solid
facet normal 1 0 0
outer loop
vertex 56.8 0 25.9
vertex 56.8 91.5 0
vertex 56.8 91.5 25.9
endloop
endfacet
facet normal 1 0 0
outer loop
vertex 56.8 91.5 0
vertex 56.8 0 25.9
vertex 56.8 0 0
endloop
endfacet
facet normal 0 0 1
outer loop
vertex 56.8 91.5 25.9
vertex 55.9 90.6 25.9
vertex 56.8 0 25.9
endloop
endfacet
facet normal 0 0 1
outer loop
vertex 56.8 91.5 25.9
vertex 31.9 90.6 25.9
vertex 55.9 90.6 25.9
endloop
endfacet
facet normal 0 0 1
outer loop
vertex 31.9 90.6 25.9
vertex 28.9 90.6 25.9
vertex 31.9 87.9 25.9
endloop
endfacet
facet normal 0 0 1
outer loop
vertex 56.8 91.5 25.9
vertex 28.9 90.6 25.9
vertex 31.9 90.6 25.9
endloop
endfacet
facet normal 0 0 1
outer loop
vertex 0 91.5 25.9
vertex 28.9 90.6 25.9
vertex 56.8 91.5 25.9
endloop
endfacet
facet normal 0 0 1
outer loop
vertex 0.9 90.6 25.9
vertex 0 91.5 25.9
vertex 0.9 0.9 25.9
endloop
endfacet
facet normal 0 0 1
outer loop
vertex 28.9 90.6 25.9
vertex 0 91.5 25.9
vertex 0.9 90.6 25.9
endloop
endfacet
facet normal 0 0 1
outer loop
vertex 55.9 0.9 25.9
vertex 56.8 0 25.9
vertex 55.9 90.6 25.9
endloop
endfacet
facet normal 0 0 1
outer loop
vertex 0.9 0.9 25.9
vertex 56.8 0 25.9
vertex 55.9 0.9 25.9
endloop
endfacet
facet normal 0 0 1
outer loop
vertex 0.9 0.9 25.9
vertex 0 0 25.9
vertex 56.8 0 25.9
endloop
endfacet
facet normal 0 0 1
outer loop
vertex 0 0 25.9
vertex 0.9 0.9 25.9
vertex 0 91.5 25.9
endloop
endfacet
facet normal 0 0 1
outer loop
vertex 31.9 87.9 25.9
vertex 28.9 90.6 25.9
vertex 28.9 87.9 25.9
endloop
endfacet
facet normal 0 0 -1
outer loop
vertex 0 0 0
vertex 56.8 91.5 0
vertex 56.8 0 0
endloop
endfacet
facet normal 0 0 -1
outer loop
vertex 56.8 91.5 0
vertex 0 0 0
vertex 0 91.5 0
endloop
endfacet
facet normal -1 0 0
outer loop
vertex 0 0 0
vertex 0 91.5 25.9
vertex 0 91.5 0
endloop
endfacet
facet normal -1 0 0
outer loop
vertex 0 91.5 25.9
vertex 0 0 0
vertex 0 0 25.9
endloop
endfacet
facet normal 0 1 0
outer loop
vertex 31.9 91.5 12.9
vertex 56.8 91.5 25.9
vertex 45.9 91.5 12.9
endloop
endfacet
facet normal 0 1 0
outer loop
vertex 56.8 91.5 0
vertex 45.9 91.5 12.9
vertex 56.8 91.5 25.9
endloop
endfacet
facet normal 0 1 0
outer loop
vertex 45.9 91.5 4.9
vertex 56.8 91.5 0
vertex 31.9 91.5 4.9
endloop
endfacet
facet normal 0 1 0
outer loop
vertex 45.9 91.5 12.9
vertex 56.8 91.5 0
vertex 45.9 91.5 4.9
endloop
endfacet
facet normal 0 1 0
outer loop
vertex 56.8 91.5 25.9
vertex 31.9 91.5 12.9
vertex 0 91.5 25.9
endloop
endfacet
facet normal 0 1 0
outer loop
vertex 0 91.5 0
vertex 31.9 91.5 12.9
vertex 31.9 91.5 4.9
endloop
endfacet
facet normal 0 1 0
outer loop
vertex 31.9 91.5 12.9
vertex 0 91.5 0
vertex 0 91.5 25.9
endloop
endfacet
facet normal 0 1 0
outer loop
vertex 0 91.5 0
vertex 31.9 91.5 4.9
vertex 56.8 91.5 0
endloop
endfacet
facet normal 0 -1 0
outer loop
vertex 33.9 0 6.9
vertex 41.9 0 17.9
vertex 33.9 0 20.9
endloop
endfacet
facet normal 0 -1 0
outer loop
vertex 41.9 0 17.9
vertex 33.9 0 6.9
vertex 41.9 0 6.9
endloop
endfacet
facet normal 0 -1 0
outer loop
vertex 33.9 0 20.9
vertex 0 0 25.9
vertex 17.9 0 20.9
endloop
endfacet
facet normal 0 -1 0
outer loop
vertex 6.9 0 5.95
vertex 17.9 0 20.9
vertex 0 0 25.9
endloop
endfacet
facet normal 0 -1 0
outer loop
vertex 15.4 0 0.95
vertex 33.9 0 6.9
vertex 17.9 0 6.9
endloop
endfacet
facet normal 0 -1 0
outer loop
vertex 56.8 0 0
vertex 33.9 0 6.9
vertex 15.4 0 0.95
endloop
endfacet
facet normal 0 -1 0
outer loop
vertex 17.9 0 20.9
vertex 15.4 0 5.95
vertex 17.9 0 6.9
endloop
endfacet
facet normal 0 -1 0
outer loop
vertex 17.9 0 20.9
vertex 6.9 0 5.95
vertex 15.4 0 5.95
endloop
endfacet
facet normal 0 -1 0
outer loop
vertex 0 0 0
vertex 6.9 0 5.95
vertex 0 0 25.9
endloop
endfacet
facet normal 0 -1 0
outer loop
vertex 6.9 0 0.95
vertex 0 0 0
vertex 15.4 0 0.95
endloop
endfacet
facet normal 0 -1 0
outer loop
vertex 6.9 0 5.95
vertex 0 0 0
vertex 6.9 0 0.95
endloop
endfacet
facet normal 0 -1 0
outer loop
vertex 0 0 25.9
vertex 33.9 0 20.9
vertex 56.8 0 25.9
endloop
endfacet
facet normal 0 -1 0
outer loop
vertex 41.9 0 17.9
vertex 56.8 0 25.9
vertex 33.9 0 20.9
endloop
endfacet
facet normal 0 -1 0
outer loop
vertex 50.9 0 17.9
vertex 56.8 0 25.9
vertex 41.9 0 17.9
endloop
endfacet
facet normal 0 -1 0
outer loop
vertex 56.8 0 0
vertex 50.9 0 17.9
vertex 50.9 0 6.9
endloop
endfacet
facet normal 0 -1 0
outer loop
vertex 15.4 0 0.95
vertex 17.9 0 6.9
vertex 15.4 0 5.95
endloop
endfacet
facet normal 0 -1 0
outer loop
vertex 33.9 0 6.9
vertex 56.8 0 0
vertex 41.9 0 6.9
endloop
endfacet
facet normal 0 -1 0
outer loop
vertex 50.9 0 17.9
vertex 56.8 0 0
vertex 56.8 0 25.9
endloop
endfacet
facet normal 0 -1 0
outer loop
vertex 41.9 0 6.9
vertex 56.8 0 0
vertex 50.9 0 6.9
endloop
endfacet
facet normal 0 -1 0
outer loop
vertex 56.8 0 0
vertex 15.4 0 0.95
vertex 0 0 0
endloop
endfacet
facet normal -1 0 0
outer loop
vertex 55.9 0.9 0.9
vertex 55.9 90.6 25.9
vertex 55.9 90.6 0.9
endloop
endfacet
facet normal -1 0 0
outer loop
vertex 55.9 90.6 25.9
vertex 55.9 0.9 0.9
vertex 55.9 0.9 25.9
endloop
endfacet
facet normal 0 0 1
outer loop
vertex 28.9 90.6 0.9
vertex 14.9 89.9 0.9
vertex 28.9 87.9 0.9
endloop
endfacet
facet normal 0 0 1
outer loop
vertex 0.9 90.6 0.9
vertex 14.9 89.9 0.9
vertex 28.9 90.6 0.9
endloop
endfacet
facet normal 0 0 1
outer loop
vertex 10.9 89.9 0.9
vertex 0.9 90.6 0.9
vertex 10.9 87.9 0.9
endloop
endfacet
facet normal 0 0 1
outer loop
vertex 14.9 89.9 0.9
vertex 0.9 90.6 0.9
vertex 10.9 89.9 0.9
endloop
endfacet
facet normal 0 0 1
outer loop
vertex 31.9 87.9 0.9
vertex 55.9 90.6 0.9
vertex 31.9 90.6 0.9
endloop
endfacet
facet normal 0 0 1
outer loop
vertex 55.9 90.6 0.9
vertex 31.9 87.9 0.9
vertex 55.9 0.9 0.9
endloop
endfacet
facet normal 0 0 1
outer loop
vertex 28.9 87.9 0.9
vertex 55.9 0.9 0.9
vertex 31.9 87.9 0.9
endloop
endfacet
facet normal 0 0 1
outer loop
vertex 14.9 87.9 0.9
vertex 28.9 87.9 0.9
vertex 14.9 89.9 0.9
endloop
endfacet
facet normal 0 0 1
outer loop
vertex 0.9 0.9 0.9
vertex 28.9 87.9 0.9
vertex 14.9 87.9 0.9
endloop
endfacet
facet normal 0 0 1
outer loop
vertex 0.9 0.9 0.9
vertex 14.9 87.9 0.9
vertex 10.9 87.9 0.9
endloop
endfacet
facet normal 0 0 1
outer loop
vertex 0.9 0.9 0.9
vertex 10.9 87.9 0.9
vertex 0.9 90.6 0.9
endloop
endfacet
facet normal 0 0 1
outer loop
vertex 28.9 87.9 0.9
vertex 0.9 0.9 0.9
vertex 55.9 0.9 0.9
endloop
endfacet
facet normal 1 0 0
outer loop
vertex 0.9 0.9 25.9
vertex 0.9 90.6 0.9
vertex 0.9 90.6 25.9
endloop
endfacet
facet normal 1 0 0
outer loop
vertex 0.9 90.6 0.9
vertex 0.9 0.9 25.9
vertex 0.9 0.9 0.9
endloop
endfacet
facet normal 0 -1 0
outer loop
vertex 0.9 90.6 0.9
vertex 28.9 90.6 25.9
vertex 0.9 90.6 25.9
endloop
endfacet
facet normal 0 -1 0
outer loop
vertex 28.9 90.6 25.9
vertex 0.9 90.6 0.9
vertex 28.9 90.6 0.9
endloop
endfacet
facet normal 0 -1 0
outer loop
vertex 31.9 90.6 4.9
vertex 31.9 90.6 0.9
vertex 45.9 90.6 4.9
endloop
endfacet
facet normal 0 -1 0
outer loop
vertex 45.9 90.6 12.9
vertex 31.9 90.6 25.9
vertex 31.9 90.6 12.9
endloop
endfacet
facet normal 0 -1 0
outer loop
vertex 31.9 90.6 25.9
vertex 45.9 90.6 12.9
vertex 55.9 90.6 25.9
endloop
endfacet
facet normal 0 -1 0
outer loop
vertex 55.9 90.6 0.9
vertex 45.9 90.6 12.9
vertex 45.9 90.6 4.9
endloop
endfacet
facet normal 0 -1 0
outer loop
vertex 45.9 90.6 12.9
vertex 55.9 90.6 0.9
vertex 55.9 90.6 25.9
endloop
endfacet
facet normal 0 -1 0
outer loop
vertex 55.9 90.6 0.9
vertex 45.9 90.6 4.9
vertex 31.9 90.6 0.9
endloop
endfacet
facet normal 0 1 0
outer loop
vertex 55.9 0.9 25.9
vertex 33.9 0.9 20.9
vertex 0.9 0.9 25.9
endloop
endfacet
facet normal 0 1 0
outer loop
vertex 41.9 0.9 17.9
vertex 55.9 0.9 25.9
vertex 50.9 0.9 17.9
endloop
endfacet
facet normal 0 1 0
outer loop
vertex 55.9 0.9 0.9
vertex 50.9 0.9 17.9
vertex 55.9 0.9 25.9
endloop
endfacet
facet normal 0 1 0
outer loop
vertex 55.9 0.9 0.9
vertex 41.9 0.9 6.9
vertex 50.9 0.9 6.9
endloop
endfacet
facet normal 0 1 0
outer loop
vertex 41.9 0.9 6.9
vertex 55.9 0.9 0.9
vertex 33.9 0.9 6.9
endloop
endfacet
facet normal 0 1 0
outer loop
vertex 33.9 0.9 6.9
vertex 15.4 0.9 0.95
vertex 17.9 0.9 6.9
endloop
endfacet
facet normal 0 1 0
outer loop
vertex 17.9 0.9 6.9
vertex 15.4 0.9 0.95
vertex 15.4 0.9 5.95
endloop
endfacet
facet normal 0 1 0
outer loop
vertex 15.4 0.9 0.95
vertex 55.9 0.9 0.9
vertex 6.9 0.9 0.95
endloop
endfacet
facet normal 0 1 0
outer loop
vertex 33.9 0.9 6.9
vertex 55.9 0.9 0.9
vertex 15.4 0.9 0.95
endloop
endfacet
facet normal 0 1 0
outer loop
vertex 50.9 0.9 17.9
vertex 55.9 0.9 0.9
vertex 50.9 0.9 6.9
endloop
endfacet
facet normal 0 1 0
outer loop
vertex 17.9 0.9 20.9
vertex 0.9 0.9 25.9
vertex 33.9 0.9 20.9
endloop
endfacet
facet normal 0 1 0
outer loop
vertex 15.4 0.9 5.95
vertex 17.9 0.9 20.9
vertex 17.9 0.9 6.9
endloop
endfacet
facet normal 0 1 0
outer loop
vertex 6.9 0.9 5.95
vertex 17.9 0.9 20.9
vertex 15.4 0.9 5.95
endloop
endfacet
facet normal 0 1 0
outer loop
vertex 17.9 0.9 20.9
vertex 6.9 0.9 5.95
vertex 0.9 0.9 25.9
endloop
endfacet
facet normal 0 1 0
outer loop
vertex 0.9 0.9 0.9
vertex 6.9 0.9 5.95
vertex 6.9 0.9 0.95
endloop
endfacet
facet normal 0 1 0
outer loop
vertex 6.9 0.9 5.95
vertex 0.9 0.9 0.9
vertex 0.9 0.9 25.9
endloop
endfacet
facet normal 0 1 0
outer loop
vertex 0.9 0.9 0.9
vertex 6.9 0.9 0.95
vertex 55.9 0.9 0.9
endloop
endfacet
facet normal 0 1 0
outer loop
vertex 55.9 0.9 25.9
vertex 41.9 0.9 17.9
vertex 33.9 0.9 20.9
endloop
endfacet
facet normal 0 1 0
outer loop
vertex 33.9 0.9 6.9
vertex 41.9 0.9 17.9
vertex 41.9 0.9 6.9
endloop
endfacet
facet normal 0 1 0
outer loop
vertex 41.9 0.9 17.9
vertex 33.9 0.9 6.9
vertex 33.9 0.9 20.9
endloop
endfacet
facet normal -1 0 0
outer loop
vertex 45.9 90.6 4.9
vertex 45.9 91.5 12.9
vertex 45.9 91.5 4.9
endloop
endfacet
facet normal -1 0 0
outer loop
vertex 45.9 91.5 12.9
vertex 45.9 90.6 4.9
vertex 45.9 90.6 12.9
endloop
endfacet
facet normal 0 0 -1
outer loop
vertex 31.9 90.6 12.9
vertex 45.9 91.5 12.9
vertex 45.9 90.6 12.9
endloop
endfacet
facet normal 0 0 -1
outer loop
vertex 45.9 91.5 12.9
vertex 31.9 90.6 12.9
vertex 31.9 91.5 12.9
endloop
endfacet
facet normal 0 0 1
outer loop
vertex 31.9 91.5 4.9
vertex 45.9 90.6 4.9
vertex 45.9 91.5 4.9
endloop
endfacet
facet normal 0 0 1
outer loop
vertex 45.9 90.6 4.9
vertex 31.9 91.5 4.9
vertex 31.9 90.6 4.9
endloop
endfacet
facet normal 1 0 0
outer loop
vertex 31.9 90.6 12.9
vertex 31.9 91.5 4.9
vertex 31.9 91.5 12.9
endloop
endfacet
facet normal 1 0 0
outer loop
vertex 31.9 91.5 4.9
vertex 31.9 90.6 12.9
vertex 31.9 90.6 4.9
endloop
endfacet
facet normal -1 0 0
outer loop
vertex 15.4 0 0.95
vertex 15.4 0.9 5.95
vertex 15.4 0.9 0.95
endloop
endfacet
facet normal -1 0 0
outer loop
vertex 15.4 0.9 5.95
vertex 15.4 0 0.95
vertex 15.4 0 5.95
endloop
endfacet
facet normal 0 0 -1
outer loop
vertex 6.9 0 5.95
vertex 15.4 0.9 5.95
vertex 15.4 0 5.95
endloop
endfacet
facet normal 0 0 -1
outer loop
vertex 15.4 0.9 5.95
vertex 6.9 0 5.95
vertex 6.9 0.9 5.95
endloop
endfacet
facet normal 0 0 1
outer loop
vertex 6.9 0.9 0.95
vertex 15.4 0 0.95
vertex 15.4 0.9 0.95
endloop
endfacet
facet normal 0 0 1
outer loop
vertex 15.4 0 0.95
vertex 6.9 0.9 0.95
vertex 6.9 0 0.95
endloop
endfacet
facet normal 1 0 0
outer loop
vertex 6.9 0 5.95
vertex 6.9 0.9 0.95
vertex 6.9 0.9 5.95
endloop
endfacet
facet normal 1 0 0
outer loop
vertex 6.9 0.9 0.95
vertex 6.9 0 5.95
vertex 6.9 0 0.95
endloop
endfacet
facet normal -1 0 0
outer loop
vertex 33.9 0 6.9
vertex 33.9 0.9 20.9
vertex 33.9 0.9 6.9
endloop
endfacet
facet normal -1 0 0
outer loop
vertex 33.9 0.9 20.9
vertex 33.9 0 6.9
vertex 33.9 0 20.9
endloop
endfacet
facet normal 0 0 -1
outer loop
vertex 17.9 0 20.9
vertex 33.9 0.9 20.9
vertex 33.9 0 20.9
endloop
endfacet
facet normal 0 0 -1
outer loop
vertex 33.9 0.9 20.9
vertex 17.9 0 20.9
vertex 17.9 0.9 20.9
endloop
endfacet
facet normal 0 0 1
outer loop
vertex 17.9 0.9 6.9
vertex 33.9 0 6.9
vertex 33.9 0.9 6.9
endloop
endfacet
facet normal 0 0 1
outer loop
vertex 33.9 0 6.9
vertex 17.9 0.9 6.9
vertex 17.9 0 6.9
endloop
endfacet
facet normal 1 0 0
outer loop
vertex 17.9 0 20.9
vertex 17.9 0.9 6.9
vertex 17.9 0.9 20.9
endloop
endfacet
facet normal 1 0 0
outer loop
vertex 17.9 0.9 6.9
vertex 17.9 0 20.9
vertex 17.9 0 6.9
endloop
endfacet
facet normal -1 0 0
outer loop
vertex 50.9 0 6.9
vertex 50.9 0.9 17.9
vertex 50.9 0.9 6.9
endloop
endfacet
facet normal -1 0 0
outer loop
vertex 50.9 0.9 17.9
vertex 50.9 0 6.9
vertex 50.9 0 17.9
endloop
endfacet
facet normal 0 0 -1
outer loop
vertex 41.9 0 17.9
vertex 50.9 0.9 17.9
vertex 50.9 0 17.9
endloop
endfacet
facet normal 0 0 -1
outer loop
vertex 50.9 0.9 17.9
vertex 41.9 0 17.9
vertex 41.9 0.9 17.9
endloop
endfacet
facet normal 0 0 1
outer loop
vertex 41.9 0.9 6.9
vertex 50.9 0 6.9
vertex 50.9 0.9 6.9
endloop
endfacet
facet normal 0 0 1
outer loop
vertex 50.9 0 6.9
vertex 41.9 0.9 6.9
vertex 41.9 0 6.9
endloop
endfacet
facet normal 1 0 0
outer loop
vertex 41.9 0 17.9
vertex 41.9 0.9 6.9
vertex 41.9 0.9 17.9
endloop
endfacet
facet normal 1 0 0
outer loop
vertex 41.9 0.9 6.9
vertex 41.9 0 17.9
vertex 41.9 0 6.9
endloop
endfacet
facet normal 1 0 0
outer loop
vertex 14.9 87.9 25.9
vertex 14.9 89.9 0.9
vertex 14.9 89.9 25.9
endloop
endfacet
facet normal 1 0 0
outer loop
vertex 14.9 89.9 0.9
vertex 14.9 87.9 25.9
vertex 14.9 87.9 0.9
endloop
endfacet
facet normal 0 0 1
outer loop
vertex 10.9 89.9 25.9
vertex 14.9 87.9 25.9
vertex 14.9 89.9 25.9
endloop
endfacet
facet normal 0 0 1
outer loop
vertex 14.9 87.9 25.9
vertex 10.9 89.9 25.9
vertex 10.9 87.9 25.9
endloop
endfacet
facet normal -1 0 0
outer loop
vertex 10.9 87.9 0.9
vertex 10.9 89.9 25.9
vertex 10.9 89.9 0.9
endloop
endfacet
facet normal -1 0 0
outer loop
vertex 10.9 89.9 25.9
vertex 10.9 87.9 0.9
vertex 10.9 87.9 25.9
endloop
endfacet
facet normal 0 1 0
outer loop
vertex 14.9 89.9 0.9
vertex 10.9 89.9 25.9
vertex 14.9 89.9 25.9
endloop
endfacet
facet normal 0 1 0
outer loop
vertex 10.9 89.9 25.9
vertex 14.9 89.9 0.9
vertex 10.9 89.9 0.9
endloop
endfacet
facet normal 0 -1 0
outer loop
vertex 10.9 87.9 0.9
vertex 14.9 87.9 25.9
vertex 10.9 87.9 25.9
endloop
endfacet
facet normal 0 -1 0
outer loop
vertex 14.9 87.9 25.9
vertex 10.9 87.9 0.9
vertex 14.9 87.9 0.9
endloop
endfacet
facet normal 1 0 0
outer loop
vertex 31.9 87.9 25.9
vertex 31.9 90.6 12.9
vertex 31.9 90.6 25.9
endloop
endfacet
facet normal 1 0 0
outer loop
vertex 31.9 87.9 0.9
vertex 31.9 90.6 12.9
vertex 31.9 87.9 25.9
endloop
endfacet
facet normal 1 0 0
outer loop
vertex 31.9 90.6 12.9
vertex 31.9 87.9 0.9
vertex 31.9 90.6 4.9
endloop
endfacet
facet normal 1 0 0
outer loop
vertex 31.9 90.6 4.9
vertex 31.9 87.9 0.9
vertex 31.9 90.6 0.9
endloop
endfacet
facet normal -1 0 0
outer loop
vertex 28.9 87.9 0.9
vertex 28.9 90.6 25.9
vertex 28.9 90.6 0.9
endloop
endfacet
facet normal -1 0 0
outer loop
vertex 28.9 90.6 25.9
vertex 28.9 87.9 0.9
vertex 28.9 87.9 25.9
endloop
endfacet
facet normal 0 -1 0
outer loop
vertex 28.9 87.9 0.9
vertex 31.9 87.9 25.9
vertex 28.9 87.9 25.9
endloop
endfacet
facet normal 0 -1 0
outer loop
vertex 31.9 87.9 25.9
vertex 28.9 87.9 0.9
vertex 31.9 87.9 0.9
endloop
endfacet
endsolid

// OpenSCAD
module box(thickness)
{
	width = 55;
	boardlength = 87;
	length = boardlength +ceil( 2/thickness) * thickness;
								      // board + uSD card. This should be and integer
								      // number of thicknesses greater then boardlength
								      // and be >= then 2 + boardlength
	height = 25;

	difference() {
	cube([width + 2 * thickness,
		length + 2* thickness,
		height +  thickness]);
	translate([thickness, thickness, thickness])
		cube([width,length,height + 3 * thickness]);
	
	translate([31 + thickness, length  ,thickness+4]) cube([14,3 * thickness,8]);//usb host
	
	translate([6+thickness, -1* thickness, .05 +thickness]) cube([8.5, thickness * 3,5]);//usb serial
	translate([17 + thickness, -thickness, 6 +thickness]) cube ([16,3 * thickness, 14]); //eathernet
	translate([41 +thickness,-thickness,6 +thickness]) cube([9,3 * thickness,11]); // power
	}
	translate([10+thickness,thickness+boardlength,thickness]) cube([4, 2, height]);// uSD card stand off
	translate([ 28+thickness, thickness + boardlength, thickness]) cube([3,length - boardlength,height]);
}

box(.9);
